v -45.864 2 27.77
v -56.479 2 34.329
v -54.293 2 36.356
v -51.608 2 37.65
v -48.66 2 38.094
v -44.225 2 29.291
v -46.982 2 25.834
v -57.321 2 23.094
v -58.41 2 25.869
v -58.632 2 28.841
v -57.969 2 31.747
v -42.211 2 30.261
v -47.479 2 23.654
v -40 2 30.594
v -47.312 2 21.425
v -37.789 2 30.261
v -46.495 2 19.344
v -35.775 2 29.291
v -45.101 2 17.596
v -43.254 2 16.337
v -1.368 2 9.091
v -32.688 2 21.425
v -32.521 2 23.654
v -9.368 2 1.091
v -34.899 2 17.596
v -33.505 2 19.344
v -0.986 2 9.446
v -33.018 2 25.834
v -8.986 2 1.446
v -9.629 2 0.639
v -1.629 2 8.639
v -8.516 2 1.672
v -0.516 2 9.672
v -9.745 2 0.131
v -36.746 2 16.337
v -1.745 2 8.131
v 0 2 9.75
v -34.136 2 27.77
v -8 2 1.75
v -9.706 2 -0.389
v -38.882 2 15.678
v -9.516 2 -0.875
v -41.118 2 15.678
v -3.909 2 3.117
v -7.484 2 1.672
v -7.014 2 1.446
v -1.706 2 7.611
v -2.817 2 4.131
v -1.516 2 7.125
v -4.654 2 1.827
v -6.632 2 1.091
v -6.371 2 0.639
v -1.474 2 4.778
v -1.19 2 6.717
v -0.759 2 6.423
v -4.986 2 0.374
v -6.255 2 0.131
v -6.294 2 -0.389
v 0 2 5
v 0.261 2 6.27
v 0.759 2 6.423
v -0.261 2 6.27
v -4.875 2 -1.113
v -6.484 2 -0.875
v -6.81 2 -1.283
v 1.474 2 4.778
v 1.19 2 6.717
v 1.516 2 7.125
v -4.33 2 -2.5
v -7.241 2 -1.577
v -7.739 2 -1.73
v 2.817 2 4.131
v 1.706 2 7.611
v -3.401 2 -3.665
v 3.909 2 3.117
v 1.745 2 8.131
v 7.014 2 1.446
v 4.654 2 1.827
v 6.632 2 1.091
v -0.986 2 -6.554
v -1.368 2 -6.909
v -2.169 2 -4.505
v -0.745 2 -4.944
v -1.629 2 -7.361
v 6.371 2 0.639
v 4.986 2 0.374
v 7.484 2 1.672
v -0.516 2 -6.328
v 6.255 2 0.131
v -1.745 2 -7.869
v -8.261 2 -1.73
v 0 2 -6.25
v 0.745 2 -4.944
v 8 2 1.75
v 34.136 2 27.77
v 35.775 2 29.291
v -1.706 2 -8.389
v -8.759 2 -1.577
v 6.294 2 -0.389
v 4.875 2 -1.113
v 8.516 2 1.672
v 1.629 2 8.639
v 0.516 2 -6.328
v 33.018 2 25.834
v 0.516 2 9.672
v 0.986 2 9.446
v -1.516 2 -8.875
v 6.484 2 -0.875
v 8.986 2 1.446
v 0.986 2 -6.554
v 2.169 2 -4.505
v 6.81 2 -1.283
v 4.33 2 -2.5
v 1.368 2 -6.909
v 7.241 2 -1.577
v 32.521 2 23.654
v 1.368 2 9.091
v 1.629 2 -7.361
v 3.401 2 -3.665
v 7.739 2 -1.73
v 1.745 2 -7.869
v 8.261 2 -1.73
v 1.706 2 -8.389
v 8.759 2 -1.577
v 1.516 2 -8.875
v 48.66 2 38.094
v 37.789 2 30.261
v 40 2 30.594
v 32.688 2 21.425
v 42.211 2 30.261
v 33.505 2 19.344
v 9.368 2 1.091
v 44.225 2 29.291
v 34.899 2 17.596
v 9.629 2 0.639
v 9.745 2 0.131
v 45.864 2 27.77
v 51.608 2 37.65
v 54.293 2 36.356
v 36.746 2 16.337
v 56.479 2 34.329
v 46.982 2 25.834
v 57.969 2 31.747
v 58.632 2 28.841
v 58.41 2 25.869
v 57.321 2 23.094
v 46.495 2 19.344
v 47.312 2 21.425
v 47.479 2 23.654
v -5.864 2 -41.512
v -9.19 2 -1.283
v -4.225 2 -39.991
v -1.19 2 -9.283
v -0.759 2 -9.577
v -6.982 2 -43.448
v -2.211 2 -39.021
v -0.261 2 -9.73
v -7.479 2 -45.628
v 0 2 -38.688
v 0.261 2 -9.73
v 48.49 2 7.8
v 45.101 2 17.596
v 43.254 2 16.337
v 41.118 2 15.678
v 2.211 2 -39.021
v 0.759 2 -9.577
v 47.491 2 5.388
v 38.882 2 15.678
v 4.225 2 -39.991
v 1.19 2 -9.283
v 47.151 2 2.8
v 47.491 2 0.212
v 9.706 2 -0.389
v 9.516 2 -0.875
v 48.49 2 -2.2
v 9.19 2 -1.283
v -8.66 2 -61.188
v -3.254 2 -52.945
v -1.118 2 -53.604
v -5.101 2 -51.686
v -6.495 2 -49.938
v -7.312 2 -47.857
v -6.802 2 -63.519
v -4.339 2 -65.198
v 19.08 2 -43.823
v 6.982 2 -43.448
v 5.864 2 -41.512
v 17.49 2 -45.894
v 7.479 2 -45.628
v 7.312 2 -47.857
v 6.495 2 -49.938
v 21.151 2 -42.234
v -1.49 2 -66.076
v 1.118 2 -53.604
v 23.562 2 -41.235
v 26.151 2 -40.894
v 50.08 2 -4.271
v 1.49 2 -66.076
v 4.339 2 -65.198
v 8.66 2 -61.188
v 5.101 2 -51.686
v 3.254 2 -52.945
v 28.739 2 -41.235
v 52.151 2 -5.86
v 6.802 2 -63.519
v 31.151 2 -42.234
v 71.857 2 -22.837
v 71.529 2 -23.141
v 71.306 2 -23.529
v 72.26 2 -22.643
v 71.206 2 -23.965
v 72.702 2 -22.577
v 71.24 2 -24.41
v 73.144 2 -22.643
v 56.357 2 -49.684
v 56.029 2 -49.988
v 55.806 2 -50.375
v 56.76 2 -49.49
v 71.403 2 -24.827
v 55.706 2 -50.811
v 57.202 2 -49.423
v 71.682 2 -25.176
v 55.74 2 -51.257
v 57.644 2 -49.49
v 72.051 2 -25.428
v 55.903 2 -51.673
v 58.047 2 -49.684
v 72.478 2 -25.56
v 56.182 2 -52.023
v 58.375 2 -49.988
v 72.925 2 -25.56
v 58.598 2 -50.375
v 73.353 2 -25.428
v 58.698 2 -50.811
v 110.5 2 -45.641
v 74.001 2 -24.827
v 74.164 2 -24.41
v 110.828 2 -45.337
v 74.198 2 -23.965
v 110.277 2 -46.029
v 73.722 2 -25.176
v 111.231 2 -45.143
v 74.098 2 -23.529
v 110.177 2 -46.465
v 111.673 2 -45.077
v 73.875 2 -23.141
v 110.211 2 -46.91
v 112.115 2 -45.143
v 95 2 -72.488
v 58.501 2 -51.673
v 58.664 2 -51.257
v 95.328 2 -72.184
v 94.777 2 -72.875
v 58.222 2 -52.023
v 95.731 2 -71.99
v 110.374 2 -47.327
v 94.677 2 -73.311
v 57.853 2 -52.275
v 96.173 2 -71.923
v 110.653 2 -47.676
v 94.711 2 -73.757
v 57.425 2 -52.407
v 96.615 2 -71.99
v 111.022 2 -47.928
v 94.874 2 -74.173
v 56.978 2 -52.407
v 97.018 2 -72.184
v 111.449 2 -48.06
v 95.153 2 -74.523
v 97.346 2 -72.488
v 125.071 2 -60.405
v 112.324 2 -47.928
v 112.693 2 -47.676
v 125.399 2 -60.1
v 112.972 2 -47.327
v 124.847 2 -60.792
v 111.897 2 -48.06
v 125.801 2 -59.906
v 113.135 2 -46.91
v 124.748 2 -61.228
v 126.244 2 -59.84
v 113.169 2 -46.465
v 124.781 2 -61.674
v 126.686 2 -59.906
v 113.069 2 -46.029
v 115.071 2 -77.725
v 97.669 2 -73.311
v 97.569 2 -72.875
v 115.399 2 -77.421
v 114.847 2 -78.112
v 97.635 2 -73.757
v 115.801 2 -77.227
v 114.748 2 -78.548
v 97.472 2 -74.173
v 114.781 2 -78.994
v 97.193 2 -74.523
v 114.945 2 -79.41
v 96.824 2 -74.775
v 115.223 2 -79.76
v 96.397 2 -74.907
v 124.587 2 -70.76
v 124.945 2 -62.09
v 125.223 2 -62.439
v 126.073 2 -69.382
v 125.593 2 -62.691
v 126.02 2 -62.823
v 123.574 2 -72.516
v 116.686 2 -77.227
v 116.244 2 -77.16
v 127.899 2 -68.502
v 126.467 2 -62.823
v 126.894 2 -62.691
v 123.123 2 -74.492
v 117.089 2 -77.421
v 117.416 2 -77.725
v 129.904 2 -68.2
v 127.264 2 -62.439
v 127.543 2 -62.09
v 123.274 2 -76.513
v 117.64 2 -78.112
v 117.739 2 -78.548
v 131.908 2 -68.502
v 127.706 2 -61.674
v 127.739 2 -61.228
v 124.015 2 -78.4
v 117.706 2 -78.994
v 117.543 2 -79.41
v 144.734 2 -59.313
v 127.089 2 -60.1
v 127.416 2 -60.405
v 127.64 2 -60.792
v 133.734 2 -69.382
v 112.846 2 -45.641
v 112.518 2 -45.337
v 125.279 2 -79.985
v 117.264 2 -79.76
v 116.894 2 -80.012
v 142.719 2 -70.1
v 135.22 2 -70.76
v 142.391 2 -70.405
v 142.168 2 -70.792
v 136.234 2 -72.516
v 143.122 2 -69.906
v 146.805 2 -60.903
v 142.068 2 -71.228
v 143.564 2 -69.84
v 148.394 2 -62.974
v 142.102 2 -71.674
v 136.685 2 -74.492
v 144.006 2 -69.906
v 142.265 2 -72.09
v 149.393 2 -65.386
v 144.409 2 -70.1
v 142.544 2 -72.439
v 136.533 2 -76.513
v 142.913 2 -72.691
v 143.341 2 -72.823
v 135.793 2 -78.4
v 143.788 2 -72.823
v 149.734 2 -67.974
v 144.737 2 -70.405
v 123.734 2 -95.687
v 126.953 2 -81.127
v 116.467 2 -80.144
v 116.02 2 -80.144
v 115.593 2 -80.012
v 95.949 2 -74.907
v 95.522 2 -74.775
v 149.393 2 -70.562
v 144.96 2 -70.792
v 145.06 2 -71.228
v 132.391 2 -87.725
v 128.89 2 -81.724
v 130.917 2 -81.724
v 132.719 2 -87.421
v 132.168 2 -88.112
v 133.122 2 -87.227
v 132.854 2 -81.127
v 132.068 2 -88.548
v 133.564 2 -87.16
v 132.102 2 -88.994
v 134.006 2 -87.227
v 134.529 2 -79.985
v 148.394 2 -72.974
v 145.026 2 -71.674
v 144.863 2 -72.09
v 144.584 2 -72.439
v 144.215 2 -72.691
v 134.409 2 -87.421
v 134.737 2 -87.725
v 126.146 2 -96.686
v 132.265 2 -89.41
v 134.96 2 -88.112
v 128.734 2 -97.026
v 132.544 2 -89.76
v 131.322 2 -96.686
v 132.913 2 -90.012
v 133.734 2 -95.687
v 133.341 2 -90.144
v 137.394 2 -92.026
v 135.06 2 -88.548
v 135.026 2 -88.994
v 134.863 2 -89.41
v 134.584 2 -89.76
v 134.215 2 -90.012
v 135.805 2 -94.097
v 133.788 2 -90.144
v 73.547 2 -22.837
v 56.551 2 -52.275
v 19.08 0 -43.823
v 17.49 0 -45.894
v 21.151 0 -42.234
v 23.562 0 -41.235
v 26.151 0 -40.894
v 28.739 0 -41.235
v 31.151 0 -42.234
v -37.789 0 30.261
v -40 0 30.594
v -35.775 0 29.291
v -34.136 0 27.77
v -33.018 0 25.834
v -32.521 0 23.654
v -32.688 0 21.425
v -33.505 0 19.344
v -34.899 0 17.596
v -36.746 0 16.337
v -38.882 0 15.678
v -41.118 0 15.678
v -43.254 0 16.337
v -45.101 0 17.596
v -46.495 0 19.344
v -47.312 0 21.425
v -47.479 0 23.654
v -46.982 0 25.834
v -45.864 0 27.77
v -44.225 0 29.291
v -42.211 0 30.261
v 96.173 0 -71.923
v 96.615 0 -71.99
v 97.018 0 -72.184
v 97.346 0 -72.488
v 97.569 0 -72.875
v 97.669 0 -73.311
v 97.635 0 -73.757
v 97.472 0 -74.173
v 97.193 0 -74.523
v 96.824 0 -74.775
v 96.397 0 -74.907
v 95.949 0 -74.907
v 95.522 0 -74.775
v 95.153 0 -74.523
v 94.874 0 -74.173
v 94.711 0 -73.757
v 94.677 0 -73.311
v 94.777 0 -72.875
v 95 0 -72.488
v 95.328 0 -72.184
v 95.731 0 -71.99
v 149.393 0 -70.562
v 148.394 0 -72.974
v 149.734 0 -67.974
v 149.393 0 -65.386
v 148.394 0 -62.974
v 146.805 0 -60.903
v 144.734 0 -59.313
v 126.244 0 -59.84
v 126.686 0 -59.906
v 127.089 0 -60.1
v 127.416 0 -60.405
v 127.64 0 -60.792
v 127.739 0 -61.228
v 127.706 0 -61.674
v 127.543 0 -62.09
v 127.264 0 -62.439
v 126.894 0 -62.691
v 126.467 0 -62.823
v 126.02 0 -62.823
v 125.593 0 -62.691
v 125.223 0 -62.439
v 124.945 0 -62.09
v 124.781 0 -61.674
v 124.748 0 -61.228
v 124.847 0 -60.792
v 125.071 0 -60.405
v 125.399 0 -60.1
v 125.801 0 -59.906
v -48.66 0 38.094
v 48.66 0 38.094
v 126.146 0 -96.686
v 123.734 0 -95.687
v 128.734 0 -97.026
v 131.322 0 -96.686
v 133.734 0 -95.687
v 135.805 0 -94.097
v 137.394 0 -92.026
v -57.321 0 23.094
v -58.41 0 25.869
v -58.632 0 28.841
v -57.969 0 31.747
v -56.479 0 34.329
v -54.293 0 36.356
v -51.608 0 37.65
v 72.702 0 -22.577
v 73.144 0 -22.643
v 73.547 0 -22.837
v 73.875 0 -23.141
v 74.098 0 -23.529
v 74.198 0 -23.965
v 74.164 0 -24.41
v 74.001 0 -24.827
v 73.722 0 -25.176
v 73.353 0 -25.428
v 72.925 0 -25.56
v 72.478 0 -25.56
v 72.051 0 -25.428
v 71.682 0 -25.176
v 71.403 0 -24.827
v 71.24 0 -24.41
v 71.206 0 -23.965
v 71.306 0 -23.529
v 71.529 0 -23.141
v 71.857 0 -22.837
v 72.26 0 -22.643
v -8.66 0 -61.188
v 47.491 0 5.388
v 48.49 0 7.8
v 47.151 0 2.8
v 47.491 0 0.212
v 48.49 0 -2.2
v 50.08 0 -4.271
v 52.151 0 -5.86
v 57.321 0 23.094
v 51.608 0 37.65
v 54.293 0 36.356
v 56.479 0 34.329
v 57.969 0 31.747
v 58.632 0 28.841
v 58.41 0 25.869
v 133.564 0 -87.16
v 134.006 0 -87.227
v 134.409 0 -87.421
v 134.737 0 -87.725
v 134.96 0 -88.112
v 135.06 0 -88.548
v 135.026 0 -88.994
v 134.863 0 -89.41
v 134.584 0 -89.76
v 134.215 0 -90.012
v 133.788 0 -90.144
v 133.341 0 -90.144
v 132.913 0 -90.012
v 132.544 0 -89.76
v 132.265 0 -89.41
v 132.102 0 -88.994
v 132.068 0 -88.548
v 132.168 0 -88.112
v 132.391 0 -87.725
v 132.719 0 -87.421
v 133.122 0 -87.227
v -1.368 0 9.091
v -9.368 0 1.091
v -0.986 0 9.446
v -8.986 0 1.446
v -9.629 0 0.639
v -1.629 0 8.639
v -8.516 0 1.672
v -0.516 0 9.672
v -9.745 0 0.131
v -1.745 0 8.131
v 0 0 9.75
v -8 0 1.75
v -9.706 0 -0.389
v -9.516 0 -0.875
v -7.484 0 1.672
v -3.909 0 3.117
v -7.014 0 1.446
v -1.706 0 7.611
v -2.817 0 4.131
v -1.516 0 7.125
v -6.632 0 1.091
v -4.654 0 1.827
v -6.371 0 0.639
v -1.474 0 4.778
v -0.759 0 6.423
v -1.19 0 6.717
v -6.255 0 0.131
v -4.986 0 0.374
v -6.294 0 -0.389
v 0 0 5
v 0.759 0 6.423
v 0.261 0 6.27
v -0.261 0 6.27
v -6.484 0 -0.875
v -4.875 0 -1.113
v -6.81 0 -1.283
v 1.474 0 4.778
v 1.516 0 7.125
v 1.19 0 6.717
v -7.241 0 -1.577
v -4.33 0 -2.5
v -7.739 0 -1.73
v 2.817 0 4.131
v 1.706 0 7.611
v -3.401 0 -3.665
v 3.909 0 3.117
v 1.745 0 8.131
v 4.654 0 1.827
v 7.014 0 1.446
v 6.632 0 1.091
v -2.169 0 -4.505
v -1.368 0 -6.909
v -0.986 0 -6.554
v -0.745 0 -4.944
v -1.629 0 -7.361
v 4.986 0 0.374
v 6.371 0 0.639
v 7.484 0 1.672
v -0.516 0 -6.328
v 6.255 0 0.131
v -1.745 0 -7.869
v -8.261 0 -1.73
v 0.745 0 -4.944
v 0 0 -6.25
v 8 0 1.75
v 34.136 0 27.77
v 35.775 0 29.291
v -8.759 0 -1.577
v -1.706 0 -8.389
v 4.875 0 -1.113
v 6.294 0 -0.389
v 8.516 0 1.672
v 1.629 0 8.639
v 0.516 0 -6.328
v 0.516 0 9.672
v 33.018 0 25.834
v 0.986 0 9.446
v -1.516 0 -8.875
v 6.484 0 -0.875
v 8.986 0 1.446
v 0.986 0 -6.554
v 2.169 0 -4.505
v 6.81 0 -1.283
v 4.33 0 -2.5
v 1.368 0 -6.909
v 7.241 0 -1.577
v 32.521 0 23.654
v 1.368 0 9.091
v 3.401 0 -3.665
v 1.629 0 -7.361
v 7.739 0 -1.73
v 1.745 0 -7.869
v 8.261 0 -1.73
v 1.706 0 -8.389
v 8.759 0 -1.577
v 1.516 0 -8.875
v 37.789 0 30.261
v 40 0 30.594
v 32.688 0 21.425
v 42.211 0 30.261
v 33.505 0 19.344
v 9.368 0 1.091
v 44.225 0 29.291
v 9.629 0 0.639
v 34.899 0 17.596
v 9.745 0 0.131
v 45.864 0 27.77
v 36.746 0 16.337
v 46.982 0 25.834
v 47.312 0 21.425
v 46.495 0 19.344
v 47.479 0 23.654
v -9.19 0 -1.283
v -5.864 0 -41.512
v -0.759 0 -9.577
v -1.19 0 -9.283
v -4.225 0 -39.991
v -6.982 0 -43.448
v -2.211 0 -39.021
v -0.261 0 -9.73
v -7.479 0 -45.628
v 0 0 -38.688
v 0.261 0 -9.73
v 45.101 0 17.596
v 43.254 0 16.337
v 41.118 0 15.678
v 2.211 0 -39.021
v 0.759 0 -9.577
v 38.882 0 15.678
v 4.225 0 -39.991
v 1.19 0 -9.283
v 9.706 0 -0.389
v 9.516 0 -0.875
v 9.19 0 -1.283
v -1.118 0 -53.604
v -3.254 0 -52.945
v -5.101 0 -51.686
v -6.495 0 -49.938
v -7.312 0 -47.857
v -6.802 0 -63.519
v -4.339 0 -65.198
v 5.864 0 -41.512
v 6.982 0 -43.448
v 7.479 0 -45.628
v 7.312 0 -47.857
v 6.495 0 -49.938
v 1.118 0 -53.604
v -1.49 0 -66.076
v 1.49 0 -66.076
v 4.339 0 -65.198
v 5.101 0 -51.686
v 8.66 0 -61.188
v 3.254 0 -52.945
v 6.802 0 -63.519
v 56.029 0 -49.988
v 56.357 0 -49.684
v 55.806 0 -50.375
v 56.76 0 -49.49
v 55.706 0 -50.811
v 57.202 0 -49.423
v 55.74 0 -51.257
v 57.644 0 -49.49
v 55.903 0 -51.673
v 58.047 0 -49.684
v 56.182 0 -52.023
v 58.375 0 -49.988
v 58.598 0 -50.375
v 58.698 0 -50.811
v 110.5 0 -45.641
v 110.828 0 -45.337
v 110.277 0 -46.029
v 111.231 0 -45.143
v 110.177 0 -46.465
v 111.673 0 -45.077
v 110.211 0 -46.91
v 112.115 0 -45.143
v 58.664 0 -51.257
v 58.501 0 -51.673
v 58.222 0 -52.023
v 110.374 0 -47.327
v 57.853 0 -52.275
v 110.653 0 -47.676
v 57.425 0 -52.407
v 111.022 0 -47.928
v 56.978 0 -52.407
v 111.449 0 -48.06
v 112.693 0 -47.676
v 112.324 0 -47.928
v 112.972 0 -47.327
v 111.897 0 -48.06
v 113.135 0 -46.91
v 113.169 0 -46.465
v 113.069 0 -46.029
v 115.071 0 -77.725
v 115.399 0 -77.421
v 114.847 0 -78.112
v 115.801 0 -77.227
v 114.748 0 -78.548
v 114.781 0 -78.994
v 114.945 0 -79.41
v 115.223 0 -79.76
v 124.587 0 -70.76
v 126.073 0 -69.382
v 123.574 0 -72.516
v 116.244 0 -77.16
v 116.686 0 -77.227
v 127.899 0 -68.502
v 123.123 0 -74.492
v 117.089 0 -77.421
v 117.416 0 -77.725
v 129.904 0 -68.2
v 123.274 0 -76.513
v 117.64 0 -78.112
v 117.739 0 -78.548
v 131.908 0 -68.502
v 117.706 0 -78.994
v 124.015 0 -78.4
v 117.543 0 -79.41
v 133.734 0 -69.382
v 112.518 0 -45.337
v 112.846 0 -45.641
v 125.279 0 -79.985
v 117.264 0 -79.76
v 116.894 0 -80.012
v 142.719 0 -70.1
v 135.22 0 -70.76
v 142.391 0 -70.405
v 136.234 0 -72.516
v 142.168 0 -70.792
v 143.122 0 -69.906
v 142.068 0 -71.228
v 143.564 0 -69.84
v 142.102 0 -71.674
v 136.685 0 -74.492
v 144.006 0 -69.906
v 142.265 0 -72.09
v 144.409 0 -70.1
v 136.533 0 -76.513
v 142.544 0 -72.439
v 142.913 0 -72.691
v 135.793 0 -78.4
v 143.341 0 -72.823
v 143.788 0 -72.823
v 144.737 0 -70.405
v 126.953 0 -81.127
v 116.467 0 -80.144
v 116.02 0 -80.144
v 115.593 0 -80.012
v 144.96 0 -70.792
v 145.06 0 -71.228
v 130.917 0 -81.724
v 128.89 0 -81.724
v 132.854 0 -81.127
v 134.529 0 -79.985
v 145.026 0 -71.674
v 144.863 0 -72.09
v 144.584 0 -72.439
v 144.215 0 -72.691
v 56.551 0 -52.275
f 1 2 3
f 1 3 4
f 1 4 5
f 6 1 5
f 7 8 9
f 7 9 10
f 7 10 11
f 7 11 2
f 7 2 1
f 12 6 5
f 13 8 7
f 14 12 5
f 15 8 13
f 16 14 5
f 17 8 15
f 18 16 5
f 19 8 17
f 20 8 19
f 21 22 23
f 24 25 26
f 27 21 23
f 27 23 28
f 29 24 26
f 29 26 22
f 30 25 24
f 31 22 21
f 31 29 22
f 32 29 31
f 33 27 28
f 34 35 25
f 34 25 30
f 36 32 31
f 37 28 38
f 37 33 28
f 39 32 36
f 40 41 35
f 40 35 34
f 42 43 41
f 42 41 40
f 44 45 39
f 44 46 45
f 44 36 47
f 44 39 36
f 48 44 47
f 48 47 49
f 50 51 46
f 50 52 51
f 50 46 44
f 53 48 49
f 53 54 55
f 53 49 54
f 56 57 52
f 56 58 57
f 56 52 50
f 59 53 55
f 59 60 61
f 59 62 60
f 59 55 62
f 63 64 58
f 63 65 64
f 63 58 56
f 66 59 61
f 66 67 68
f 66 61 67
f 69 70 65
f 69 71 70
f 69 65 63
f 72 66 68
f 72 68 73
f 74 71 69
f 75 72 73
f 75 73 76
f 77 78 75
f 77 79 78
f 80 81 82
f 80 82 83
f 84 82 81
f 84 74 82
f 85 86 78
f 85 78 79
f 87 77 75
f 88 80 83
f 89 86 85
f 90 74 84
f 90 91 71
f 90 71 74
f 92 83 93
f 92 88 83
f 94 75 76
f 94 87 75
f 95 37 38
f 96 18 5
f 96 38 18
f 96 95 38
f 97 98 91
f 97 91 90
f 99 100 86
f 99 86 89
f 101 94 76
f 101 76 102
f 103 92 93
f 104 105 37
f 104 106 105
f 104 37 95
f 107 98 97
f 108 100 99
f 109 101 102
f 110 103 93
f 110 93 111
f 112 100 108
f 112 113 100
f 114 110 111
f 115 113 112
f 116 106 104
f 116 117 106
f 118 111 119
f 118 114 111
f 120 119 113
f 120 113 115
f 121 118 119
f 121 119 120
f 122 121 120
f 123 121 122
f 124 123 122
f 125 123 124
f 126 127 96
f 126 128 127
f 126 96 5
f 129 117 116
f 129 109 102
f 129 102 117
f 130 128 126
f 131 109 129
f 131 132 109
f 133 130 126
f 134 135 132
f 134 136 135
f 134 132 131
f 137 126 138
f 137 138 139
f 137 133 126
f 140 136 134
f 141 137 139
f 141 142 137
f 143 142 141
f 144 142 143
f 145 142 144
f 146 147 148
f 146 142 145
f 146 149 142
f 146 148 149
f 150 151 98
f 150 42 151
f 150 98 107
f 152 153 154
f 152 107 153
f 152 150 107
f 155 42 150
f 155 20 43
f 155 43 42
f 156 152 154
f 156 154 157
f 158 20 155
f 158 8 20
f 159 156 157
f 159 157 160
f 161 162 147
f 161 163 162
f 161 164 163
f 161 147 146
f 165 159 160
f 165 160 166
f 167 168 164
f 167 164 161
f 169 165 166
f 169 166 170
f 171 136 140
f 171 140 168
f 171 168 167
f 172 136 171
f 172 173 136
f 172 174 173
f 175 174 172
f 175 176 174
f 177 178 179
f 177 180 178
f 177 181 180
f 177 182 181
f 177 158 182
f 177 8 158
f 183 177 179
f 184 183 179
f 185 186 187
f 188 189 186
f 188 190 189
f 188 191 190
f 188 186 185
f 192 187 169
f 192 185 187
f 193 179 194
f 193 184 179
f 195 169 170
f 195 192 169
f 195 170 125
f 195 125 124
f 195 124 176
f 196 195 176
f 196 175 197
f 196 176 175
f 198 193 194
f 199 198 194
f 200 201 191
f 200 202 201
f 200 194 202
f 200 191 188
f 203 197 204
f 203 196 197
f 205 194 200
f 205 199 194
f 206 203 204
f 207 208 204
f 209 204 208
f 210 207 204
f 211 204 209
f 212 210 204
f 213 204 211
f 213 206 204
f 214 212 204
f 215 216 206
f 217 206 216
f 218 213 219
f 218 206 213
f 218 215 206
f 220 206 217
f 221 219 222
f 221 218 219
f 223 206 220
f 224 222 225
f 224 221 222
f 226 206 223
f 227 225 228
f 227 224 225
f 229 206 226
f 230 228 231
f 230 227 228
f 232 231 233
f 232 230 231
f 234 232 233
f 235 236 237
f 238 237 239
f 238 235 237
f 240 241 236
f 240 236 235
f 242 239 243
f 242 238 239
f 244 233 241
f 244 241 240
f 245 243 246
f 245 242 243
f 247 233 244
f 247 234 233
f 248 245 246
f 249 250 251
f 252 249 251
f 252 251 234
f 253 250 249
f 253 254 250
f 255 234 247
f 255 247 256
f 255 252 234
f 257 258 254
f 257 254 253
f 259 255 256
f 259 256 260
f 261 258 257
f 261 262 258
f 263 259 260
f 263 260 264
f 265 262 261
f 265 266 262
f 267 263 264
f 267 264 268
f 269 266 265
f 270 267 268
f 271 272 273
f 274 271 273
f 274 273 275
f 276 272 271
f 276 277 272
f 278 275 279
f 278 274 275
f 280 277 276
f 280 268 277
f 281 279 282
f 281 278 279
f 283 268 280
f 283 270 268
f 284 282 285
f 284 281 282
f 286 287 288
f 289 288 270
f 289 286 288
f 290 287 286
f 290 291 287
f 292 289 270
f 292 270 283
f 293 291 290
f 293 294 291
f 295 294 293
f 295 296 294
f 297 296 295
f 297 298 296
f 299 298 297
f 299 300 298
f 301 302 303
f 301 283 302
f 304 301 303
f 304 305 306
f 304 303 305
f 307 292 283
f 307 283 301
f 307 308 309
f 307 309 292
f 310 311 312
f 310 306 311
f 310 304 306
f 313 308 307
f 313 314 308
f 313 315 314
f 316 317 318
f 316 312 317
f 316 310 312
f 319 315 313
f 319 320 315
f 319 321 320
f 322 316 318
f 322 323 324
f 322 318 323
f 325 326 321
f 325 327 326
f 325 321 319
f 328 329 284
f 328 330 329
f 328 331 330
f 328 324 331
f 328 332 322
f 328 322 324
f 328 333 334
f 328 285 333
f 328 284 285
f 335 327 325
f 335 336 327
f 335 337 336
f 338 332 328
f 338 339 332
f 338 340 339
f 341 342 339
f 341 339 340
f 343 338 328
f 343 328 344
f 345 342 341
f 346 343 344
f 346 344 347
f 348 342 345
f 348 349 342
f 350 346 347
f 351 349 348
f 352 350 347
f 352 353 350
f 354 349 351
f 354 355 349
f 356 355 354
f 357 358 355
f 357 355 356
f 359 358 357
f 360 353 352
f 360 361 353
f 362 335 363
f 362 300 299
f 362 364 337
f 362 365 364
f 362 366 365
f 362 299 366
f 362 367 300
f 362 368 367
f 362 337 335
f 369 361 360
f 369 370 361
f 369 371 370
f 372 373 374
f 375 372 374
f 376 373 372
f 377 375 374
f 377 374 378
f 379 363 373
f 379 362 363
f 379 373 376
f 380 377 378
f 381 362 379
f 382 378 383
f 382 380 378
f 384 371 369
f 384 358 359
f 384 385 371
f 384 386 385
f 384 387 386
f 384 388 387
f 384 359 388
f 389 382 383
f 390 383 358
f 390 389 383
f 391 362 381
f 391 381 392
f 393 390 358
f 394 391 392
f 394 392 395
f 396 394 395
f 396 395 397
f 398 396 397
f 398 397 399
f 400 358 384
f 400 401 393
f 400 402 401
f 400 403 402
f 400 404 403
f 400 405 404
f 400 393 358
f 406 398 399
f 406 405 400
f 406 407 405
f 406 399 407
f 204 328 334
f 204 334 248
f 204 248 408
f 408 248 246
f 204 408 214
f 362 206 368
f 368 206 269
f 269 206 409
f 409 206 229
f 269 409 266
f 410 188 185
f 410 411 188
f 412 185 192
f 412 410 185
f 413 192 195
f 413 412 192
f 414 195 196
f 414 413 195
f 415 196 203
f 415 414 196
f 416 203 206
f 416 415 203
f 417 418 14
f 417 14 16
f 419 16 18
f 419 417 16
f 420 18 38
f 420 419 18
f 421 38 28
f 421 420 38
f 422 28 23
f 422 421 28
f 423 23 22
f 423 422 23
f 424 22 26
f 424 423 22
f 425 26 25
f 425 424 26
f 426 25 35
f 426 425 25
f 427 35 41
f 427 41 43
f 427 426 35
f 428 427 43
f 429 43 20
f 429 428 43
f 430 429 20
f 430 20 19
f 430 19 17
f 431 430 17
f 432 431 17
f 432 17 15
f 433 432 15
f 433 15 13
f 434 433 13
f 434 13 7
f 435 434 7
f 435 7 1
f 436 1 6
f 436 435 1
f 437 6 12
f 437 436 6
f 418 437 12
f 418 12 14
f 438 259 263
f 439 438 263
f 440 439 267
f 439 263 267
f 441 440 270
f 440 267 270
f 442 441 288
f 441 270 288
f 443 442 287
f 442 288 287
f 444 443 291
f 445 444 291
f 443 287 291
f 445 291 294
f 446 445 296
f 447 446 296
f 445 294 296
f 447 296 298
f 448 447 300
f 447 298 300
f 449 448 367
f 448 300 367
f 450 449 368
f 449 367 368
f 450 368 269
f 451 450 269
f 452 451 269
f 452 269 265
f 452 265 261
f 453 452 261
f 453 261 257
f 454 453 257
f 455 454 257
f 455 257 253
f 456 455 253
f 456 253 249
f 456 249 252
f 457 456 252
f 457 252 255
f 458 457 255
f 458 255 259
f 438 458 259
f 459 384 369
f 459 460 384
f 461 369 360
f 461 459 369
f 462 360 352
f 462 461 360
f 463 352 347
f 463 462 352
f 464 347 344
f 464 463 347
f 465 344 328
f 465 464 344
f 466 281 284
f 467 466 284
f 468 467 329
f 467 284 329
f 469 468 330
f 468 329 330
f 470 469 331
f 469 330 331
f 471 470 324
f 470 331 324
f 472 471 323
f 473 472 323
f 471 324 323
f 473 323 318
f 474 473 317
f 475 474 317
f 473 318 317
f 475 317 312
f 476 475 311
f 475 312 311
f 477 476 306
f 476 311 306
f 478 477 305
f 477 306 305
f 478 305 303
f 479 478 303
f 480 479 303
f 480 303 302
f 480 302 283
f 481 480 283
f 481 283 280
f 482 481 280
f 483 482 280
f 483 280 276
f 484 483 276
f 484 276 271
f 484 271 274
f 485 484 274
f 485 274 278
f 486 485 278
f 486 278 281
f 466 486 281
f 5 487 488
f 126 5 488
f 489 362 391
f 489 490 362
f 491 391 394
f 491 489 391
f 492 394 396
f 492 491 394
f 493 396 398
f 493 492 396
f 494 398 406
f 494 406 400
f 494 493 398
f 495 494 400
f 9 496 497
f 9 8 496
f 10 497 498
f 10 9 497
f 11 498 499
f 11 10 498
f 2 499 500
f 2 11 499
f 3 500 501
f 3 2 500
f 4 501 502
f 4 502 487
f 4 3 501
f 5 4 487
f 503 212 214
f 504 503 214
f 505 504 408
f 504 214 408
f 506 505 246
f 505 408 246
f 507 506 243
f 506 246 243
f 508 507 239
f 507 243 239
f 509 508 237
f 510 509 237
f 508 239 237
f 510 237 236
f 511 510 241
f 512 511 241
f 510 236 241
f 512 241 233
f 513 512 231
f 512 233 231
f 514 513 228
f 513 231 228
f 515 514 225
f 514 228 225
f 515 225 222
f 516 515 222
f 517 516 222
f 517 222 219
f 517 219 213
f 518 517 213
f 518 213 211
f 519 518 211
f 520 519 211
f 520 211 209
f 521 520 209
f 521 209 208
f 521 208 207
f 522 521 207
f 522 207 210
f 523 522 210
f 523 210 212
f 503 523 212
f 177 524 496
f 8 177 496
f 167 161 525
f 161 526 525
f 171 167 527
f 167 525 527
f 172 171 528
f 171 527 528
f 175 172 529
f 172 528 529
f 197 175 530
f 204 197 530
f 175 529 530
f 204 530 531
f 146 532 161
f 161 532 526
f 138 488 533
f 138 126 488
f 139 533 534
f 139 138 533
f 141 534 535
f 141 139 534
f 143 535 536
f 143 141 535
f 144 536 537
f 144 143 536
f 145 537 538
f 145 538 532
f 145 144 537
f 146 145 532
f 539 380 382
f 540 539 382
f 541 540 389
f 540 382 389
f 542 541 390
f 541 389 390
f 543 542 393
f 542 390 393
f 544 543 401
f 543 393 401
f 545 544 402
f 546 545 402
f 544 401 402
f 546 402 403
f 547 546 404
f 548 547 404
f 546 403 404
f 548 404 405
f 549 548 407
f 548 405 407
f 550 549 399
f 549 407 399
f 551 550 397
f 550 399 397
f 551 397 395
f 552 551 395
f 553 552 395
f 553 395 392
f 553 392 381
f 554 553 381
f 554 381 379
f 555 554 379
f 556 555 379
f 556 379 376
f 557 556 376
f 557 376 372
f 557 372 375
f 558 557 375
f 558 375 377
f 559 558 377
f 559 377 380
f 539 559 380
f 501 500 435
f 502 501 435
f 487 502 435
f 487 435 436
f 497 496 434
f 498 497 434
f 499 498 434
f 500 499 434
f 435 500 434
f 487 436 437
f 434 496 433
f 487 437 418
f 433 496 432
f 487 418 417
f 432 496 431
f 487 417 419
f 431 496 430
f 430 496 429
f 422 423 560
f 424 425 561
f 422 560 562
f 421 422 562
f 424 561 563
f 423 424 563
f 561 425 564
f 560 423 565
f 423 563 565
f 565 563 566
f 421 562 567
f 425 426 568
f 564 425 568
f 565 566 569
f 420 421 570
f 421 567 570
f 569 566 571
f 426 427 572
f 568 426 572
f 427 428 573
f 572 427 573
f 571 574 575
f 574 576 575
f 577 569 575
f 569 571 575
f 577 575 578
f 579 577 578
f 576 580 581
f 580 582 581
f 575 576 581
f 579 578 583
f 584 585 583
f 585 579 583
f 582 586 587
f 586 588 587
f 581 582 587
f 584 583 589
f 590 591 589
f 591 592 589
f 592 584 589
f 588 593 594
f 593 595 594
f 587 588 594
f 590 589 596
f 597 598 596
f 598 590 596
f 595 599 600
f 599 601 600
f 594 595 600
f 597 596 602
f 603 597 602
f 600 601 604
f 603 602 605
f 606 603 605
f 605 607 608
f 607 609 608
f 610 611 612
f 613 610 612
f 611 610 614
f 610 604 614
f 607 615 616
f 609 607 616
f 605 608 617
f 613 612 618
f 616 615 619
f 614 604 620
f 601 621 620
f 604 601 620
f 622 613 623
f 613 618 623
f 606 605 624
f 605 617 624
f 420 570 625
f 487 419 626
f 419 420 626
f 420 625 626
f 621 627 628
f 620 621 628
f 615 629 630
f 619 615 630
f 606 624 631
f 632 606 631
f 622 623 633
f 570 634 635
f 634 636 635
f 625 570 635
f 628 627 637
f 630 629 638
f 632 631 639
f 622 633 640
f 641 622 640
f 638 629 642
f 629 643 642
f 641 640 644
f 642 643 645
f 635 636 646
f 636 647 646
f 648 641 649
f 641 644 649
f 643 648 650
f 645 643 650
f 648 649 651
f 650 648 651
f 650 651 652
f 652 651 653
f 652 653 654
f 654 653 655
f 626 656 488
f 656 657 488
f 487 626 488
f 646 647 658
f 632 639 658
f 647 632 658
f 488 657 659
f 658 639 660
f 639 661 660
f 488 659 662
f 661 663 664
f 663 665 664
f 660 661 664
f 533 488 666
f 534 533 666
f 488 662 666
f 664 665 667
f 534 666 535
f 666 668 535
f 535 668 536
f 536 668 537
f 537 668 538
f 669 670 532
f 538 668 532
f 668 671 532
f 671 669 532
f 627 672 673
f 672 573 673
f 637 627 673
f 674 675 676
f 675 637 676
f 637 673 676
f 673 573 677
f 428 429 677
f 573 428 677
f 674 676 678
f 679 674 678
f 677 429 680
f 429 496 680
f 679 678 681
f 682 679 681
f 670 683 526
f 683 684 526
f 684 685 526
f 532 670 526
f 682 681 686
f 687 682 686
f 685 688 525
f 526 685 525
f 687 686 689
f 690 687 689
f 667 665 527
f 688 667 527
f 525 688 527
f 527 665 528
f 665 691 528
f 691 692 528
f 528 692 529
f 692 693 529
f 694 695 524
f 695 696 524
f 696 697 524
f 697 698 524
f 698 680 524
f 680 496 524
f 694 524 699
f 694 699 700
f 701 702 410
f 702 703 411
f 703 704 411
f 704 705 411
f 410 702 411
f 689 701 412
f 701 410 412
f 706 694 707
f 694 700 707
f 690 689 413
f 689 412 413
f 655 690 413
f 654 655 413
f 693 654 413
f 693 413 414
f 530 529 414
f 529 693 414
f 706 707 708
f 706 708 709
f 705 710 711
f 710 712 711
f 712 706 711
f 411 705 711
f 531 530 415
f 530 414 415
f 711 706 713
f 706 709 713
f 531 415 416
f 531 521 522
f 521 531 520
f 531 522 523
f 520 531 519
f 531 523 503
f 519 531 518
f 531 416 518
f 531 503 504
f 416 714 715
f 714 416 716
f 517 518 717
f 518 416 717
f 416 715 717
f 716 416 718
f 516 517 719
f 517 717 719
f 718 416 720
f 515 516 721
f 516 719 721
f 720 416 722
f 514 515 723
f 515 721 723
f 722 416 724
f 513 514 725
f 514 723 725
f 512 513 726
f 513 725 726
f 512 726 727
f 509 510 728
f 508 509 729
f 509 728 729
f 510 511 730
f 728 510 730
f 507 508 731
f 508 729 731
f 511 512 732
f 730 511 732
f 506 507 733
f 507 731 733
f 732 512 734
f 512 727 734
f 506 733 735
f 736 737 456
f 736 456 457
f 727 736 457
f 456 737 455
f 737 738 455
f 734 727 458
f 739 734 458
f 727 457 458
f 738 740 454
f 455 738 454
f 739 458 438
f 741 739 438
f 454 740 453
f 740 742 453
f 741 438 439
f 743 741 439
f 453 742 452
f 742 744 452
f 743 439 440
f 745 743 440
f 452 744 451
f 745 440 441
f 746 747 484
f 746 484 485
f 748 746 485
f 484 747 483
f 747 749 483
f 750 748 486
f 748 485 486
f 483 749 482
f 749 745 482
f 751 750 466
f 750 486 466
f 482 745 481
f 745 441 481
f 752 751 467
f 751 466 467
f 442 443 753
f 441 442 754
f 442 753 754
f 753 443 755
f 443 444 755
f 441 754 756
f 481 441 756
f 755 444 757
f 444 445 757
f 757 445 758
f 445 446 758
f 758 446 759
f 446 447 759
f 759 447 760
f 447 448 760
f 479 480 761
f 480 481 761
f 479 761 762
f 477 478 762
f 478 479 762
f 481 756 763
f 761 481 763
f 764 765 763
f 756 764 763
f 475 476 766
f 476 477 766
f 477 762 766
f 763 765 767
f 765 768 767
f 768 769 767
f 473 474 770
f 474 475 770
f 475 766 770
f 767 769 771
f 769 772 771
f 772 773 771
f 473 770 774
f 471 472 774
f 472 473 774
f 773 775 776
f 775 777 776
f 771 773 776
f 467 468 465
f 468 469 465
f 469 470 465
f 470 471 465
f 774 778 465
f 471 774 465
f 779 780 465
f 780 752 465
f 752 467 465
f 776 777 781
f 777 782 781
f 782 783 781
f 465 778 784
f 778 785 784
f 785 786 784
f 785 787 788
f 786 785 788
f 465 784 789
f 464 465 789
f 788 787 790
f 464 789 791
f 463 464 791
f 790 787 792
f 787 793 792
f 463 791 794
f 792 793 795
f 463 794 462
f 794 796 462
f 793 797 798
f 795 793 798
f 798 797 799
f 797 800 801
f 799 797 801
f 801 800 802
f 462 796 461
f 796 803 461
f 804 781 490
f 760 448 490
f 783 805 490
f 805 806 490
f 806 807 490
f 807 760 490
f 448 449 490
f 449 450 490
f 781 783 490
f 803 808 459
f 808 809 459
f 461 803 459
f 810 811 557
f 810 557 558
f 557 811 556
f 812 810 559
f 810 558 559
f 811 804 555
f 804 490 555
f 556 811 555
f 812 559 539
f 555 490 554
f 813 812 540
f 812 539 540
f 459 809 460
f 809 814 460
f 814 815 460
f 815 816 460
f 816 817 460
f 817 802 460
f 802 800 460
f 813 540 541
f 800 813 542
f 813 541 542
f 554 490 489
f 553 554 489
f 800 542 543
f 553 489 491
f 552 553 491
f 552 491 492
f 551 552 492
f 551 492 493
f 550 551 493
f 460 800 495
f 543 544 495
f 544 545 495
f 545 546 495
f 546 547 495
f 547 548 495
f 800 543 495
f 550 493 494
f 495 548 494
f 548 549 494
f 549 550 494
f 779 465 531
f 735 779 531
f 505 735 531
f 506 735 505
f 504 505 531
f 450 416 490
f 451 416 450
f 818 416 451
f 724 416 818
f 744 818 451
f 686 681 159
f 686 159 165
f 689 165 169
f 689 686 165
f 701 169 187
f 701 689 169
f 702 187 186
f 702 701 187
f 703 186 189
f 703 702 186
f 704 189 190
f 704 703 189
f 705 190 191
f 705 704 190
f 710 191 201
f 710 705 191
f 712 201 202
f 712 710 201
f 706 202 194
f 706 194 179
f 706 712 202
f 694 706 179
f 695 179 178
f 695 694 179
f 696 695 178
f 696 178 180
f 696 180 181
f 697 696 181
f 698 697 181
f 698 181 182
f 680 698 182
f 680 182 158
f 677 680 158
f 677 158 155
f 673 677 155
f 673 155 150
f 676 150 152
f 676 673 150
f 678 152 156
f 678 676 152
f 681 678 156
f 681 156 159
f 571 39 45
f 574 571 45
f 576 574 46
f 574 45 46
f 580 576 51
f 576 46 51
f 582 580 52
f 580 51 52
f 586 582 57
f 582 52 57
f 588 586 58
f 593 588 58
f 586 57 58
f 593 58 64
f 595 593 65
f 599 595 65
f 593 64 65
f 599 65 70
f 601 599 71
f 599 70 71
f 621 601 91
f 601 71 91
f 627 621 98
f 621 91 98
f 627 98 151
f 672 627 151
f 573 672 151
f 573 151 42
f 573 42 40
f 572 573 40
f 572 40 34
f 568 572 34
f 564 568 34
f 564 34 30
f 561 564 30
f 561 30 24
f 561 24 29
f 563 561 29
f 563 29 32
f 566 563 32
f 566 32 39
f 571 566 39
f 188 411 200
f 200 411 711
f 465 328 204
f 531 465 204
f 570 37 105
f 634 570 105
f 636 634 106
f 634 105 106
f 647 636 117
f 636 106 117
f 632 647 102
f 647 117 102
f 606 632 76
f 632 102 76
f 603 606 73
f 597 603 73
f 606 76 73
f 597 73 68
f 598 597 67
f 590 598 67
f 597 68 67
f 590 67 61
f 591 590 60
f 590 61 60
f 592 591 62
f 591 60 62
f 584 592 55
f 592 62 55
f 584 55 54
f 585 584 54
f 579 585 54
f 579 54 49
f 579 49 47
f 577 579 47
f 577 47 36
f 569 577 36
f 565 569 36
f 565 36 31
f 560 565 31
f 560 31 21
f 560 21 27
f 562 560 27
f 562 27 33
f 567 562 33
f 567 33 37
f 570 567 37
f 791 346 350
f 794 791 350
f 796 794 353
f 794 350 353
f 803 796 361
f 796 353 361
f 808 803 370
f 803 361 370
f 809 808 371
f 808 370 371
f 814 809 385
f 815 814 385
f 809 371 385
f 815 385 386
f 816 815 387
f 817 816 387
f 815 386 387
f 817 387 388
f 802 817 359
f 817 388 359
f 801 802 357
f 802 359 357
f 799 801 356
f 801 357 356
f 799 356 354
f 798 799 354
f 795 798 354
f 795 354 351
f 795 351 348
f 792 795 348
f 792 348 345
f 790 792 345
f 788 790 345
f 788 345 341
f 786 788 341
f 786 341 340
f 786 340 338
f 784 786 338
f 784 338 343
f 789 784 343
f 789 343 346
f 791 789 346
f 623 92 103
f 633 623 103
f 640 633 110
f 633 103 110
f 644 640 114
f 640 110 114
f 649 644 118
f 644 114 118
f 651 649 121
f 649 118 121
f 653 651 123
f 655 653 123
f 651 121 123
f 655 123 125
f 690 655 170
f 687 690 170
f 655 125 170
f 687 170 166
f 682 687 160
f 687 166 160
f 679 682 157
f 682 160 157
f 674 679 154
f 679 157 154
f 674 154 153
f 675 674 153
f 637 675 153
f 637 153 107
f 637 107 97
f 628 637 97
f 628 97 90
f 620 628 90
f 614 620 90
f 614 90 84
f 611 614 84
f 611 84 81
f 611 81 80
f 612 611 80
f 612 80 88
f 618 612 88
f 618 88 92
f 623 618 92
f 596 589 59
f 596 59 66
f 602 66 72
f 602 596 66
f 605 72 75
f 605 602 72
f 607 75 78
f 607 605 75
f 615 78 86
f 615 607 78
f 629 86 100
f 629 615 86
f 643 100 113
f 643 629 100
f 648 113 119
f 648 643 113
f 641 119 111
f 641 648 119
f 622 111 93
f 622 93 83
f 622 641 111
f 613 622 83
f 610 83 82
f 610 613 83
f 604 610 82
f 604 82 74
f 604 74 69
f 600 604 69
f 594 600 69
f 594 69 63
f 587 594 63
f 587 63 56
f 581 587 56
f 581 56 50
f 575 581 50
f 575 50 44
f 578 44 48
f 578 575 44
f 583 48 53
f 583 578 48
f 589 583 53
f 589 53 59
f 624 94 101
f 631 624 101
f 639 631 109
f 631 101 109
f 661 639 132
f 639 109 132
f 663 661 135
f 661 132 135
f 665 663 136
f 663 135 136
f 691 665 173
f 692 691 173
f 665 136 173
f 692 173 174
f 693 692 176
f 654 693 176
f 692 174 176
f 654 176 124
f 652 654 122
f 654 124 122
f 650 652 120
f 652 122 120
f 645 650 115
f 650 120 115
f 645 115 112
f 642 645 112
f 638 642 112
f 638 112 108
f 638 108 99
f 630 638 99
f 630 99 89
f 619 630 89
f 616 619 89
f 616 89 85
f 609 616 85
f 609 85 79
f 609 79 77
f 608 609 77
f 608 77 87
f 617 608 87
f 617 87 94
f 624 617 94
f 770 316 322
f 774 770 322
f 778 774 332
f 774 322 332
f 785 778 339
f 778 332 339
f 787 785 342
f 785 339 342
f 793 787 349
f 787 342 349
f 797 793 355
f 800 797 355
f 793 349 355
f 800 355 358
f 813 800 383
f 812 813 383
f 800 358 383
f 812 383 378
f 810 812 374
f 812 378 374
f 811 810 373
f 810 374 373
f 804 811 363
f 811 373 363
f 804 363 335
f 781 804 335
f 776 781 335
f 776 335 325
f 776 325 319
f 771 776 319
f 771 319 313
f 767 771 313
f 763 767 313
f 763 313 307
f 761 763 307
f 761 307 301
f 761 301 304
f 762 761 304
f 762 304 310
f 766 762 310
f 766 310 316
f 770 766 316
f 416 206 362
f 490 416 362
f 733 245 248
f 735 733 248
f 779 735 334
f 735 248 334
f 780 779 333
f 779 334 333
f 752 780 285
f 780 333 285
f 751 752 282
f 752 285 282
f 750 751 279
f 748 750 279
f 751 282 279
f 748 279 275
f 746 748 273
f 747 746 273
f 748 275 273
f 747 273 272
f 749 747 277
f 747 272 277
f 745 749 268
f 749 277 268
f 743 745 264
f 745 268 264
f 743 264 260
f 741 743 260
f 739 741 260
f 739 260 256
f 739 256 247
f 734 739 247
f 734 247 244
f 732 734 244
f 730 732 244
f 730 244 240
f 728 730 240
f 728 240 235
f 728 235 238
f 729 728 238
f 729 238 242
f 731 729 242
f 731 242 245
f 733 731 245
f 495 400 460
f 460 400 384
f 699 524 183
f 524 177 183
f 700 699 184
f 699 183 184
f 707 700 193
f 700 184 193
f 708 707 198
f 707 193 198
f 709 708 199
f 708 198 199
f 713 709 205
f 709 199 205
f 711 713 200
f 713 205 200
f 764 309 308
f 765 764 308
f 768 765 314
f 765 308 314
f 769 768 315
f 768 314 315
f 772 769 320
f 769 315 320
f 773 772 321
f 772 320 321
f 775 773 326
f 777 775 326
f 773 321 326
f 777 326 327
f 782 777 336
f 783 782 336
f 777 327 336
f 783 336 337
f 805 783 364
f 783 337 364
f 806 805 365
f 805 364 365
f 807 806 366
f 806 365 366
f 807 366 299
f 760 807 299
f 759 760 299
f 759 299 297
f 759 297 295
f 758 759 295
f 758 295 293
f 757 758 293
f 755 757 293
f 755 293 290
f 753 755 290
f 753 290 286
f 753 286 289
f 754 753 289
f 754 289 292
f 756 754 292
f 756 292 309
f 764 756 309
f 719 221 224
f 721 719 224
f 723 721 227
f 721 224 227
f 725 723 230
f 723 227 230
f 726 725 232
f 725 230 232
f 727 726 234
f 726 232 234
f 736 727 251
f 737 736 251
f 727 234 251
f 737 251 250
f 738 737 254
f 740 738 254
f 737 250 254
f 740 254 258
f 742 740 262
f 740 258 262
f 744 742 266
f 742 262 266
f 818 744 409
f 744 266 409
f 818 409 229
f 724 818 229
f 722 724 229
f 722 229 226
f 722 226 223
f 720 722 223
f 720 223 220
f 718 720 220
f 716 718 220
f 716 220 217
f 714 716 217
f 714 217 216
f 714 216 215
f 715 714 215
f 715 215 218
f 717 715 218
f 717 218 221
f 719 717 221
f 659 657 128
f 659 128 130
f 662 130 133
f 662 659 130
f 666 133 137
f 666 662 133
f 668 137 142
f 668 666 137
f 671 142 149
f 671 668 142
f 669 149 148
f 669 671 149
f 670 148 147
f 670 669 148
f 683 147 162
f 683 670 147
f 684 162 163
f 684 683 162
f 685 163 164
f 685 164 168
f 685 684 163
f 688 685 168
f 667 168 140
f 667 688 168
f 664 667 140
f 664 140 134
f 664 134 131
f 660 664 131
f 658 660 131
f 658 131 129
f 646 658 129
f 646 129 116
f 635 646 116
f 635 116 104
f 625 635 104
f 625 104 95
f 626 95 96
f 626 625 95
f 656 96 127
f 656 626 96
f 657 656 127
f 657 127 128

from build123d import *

# Parameters (mm, degrees)
SKETCH1_R           = 7.5
SKETCH1_R_2         = 5
BOSS_EXTRUDE1_DEPTH = 2
BOSS_EXTRUDE2_DEPTH = 2
FILLET1_R           = 10
SKETCH3_R           = 6.8
CUT_EXTRUDE1_DEPTH  = 10
SKETCH4_R           = 1.5
CUT_EXTRUDE2_DEPTH  = 10
SKETCH5_R           = 1.5
CUT_EXTRUDE3_DEPTH  = 10
SKETCH6_R           = 1.75
CUT_EXTRUDE4_DEPTH  = 179.433043373


with BuildPart() as part:
    # Sketch1 → Boss-Extrude1 (new body)
    with BuildSketch(Plane(origin=(0, 0, 0), x_dir=(1, 0, 0), z_dir=(0, 1, 0))):
        Polygon((0, 76.188021535), (-65.980762114, -38.094010768), (65.980762114, -38.094010768), align=None)
        with Locations(Location((0, 46.188021535, 0), (0, 0, 270))):
            Circle(SKETCH1_R, mode=Mode.SUBTRACT)
        with Locations(Location((-40, -23.094010768, 0), (0, 0, 270))):
            Circle(SKETCH1_R, mode=Mode.SUBTRACT)
        with Locations(Location((40, -23.094010768, 0), (0, 0, 270))):
            Circle(SKETCH1_R, mode=Mode.SUBTRACT)
        with Locations(Location((0, 0, 0), (0, 0, 270))):
            Circle(SKETCH1_R_2, mode=Mode.SUBTRACT)
    extrude(amount=BOSS_EXTRUDE1_DEPTH)

    # Sketch2 → Boss-Extrude2 (add)
    with BuildSketch(Plane(origin=(0, 2, 0), x_dir=(1, 0, 0), z_dir=(0, 1, 0))):
        Polygon((43.490381057, 0.860471904), (22.490381057, 37.233538863), (132.394191624, 100.686533479), (153.394191624, 64.313466521), align=None)
    extrude(amount=-BOSS_EXTRUDE2_DEPTH)

    # Fillet1
    fillet1_edges = [part.edges().sort_by_distance(p)[0] for p in [
        (153.394191624, 1, -64.313466521),
        (43.490381057, 1, -0.860471904),
        (22.490381057, 1, -37.233538863),
        (132.394191624, 1, -100.686533479),
        (65.980762114, 1, 38.094010768),
        (-65.980762114, 1, 38.094010768),
        (0, 1, -76.188021535),
    ]]
    fillet(fillet1_edges, radius=FILLET1_R)

    # Sketch3 → Cut-Extrude1 (cut)
    with BuildSketch(Plane(origin=(0, 2, 0), x_dir=(1, 0, 0), z_dir=(0, 1, 0))):
        with Locations(Location((129.903810568, 75, 0), (0, 0, 270))):
            Circle(SKETCH3_R)
    extrude(amount=-CUT_EXTRUDE1_DEPTH, mode=Mode.SUBTRACT)

    # Sketch4 → Cut-Extrude2 (cut)
    with BuildSketch(Plane(origin=(0, 2, 0), x_dir=(1, 0, 0), z_dir=(0, 1, 0))):
        with Locations(Location((133.564064606, 88.660254038, 0), (0, 0, 270))):
            Circle(SKETCH4_R)
        with Locations(Location((116.24355653, 78.660254038, 0), (0, 0, 270))):
            Circle(SKETCH4_R)
        with Locations(Location((126.24355653, 61.339745962, 0), (0, 0, 270))):
            Circle(SKETCH4_R)
        with Locations(Location((143.564064606, 71.339745962, 0), (0, 0, 270))):
            Circle(SKETCH4_R)
    extrude(amount=-CUT_EXTRUDE2_DEPTH, mode=Mode.SUBTRACT)

    # Sketch5 → Cut-Extrude3 (cut)
    with BuildSketch(Plane(origin=(0, 2, 0), x_dir=(1, 0, 0), z_dir=(0, 1, 0))):
        with Locations(Location((96.173048454, 73.423393759, 0), (0, 0, 270))):
            Circle(SKETCH5_R)
        with Locations(Location((57.201905284, 50.923393759, 0), (0, 0, 270))):
            Circle(SKETCH5_R)
        with Locations(Location((111.673048454, 46.576606241, 0), (0, 0, 270))):
            Circle(SKETCH5_R)
        with Locations(Location((72.701905284, 24.076606241, 0), (0, 0, 270))):
            Circle(SKETCH5_R)
    extrude(amount=-CUT_EXTRUDE3_DEPTH, mode=Mode.SUBTRACT)

    # Sketch6 → Cut-Extrude4 (cut, through all)
    with BuildSketch(Plane(origin=(0, 2, 0), x_dir=(1, 0, 0), z_dir=(0, 1, 0))):
        with Locations(Location((0, 8, 0), (0, 0, 270))):
            Circle(SKETCH6_R)
        with Locations(Location((8, 0, 0), (0, 0, 270))):
            Circle(SKETCH6_R)
        with Locations(Location((0, -8, 0), (0, 0, 270))):
            Circle(SKETCH6_R)
        with Locations(Location((-8, 0, 0), (0, 0, 270))):
            Circle(SKETCH6_R)
    extrude(amount=-CUT_EXTRUDE4_DEPTH, mode=Mode.SUBTRACT)


solid = part.part
